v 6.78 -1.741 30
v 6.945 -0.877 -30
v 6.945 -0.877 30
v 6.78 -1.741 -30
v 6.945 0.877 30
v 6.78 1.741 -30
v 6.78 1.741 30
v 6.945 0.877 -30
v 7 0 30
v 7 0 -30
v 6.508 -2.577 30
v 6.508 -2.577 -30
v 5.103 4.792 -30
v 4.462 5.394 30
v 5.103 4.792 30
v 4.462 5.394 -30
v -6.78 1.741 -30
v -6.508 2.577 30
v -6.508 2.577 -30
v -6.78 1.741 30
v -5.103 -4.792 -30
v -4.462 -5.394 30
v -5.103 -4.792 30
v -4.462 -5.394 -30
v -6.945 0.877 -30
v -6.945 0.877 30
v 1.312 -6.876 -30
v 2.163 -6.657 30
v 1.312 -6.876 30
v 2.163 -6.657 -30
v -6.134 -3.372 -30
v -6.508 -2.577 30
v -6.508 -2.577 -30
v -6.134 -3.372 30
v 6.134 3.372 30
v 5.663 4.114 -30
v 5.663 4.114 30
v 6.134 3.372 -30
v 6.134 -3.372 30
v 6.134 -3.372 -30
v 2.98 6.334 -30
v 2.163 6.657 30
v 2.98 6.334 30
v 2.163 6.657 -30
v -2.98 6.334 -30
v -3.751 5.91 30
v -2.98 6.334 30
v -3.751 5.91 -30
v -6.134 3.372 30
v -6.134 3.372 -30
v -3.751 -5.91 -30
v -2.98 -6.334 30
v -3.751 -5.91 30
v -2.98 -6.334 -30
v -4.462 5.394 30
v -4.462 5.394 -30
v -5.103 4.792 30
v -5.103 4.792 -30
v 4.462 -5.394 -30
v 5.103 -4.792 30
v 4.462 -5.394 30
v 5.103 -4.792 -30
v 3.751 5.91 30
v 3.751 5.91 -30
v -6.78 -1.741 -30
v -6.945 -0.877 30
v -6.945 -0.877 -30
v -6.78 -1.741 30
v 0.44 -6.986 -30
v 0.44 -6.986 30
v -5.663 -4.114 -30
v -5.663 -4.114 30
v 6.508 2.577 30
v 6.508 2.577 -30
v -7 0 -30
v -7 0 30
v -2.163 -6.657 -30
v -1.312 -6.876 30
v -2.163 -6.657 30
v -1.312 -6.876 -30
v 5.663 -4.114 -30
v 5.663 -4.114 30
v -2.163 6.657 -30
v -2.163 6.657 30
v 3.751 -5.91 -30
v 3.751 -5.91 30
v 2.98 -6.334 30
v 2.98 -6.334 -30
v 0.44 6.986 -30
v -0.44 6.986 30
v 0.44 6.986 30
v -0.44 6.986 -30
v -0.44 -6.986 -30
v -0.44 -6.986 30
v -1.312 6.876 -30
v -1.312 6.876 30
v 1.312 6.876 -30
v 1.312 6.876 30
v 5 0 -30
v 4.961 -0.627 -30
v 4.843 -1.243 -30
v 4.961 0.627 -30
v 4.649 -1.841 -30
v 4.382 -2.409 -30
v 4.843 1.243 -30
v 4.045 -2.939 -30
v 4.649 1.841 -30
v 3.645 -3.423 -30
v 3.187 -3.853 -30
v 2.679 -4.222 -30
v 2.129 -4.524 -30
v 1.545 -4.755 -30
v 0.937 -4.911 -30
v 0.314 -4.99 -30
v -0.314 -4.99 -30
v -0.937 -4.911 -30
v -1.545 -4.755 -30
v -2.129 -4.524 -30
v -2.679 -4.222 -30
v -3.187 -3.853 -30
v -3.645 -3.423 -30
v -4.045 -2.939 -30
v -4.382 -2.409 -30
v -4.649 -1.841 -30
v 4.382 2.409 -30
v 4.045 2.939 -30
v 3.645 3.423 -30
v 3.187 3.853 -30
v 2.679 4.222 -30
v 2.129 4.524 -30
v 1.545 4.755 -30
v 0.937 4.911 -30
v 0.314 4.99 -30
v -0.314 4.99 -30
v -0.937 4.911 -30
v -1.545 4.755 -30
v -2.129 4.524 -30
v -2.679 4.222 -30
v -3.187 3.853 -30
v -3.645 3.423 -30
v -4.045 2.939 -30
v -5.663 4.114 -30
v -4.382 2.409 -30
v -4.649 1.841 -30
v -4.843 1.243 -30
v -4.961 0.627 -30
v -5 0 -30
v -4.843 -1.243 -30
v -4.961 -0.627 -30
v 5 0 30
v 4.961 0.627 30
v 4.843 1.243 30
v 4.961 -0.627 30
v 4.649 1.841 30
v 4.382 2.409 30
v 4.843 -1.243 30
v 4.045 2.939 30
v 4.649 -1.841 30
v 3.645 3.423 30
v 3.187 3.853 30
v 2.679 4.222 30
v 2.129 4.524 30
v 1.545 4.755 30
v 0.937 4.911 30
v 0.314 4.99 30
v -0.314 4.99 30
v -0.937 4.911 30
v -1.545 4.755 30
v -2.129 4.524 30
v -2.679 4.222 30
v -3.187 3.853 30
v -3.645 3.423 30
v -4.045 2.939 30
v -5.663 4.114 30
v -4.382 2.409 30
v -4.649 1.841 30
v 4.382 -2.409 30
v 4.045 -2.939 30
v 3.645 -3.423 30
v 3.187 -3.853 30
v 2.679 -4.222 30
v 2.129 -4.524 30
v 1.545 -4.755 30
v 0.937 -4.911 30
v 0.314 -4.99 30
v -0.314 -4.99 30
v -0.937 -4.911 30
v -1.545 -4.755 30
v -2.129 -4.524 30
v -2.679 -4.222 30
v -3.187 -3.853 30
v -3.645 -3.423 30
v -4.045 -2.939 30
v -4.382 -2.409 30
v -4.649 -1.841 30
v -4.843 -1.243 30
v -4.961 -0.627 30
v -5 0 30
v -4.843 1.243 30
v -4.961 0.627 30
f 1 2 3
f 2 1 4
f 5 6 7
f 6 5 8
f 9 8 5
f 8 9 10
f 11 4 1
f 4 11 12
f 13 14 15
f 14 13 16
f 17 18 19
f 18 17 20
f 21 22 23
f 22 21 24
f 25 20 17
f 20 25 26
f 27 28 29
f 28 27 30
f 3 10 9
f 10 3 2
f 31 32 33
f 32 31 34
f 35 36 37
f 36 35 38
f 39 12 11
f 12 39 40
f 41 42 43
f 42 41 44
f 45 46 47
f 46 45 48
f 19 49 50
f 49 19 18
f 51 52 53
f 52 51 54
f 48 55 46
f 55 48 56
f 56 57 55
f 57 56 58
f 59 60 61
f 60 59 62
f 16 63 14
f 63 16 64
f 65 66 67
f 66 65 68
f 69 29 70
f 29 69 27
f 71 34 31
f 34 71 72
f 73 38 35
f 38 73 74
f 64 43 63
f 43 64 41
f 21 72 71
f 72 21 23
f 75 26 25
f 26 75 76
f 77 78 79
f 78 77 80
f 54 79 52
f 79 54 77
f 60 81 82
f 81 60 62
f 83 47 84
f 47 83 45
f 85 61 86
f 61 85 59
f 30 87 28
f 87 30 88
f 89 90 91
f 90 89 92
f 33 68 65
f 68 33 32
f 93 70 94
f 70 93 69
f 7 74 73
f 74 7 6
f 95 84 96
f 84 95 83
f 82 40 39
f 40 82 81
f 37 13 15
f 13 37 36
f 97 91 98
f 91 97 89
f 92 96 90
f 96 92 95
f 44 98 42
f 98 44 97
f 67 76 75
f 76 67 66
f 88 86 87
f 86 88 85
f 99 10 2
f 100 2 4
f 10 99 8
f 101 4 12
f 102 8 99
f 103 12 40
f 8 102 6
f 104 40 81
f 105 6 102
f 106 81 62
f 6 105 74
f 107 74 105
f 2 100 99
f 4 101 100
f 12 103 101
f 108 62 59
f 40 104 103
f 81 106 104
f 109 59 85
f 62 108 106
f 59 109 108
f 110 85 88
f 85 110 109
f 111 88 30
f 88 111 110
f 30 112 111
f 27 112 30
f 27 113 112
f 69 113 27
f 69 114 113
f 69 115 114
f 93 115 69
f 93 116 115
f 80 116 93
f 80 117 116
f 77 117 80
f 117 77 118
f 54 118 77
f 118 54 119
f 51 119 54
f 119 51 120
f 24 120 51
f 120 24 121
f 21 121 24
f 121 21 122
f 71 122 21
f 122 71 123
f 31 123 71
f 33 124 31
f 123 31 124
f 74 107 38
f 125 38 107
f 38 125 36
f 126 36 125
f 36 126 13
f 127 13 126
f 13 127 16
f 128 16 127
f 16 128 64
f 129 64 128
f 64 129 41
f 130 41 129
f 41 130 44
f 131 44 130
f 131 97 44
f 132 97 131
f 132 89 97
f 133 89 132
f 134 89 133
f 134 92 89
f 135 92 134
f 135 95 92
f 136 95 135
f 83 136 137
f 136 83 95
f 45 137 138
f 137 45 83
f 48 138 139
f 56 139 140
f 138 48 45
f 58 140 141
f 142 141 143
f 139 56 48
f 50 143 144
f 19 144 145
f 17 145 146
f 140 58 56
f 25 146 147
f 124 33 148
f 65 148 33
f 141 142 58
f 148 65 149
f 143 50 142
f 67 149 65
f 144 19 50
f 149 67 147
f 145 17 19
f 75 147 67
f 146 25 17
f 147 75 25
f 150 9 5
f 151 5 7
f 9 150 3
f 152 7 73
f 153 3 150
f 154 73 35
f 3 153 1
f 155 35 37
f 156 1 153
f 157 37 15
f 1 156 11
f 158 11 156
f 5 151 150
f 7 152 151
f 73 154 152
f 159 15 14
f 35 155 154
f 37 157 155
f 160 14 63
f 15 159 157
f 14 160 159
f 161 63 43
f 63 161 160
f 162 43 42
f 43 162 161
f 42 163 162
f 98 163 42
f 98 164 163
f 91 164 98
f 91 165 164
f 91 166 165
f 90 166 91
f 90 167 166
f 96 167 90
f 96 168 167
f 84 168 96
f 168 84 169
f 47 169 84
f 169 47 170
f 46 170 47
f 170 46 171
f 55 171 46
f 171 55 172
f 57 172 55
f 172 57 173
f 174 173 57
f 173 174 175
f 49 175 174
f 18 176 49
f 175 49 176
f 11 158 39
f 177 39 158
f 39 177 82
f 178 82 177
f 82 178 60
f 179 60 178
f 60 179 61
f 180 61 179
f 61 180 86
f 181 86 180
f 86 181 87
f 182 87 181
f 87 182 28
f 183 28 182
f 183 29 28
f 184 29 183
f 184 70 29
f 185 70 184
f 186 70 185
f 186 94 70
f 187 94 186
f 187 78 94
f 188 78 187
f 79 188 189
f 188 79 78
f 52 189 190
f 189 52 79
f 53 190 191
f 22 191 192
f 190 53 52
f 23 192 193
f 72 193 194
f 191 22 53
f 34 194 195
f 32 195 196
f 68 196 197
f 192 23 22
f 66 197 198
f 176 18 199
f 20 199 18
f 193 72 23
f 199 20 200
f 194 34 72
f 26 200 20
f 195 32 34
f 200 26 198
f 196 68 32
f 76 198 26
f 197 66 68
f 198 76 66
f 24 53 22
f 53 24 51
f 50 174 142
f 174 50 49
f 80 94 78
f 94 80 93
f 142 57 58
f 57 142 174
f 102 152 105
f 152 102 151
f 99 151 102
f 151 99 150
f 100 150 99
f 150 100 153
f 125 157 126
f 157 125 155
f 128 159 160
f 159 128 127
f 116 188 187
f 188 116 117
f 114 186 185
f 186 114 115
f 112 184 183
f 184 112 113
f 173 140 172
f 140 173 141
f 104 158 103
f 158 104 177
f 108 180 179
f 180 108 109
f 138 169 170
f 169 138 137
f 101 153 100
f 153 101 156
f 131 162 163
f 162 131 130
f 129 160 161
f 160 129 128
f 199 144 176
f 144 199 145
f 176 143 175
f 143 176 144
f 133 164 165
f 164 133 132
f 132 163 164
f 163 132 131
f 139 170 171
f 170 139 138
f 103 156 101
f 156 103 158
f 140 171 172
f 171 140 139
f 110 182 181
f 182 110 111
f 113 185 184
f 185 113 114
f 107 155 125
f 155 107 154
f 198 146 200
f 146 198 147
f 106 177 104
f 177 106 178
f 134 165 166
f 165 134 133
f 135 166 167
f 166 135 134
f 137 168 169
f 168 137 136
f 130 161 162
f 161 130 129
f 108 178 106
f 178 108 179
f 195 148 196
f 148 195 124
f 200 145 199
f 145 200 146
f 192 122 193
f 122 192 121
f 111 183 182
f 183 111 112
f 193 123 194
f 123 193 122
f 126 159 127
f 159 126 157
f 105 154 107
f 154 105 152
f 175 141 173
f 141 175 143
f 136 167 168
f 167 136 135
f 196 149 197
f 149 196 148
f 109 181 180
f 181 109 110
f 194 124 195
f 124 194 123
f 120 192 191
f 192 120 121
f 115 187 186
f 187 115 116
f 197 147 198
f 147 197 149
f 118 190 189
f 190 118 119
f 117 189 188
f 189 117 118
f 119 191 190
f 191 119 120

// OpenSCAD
$fn = 50;


difference() {
	union() {
		translate(v = [0, 0, -30.0000000000]) {
			cylinder(h = 60, r = 7.0000000000);
		}
	}
	union() {
		translate(v = [0, 0, -100.0000000000]) {
			cylinder(h = 200, r = 5.0000000000);
		}
	}
}
